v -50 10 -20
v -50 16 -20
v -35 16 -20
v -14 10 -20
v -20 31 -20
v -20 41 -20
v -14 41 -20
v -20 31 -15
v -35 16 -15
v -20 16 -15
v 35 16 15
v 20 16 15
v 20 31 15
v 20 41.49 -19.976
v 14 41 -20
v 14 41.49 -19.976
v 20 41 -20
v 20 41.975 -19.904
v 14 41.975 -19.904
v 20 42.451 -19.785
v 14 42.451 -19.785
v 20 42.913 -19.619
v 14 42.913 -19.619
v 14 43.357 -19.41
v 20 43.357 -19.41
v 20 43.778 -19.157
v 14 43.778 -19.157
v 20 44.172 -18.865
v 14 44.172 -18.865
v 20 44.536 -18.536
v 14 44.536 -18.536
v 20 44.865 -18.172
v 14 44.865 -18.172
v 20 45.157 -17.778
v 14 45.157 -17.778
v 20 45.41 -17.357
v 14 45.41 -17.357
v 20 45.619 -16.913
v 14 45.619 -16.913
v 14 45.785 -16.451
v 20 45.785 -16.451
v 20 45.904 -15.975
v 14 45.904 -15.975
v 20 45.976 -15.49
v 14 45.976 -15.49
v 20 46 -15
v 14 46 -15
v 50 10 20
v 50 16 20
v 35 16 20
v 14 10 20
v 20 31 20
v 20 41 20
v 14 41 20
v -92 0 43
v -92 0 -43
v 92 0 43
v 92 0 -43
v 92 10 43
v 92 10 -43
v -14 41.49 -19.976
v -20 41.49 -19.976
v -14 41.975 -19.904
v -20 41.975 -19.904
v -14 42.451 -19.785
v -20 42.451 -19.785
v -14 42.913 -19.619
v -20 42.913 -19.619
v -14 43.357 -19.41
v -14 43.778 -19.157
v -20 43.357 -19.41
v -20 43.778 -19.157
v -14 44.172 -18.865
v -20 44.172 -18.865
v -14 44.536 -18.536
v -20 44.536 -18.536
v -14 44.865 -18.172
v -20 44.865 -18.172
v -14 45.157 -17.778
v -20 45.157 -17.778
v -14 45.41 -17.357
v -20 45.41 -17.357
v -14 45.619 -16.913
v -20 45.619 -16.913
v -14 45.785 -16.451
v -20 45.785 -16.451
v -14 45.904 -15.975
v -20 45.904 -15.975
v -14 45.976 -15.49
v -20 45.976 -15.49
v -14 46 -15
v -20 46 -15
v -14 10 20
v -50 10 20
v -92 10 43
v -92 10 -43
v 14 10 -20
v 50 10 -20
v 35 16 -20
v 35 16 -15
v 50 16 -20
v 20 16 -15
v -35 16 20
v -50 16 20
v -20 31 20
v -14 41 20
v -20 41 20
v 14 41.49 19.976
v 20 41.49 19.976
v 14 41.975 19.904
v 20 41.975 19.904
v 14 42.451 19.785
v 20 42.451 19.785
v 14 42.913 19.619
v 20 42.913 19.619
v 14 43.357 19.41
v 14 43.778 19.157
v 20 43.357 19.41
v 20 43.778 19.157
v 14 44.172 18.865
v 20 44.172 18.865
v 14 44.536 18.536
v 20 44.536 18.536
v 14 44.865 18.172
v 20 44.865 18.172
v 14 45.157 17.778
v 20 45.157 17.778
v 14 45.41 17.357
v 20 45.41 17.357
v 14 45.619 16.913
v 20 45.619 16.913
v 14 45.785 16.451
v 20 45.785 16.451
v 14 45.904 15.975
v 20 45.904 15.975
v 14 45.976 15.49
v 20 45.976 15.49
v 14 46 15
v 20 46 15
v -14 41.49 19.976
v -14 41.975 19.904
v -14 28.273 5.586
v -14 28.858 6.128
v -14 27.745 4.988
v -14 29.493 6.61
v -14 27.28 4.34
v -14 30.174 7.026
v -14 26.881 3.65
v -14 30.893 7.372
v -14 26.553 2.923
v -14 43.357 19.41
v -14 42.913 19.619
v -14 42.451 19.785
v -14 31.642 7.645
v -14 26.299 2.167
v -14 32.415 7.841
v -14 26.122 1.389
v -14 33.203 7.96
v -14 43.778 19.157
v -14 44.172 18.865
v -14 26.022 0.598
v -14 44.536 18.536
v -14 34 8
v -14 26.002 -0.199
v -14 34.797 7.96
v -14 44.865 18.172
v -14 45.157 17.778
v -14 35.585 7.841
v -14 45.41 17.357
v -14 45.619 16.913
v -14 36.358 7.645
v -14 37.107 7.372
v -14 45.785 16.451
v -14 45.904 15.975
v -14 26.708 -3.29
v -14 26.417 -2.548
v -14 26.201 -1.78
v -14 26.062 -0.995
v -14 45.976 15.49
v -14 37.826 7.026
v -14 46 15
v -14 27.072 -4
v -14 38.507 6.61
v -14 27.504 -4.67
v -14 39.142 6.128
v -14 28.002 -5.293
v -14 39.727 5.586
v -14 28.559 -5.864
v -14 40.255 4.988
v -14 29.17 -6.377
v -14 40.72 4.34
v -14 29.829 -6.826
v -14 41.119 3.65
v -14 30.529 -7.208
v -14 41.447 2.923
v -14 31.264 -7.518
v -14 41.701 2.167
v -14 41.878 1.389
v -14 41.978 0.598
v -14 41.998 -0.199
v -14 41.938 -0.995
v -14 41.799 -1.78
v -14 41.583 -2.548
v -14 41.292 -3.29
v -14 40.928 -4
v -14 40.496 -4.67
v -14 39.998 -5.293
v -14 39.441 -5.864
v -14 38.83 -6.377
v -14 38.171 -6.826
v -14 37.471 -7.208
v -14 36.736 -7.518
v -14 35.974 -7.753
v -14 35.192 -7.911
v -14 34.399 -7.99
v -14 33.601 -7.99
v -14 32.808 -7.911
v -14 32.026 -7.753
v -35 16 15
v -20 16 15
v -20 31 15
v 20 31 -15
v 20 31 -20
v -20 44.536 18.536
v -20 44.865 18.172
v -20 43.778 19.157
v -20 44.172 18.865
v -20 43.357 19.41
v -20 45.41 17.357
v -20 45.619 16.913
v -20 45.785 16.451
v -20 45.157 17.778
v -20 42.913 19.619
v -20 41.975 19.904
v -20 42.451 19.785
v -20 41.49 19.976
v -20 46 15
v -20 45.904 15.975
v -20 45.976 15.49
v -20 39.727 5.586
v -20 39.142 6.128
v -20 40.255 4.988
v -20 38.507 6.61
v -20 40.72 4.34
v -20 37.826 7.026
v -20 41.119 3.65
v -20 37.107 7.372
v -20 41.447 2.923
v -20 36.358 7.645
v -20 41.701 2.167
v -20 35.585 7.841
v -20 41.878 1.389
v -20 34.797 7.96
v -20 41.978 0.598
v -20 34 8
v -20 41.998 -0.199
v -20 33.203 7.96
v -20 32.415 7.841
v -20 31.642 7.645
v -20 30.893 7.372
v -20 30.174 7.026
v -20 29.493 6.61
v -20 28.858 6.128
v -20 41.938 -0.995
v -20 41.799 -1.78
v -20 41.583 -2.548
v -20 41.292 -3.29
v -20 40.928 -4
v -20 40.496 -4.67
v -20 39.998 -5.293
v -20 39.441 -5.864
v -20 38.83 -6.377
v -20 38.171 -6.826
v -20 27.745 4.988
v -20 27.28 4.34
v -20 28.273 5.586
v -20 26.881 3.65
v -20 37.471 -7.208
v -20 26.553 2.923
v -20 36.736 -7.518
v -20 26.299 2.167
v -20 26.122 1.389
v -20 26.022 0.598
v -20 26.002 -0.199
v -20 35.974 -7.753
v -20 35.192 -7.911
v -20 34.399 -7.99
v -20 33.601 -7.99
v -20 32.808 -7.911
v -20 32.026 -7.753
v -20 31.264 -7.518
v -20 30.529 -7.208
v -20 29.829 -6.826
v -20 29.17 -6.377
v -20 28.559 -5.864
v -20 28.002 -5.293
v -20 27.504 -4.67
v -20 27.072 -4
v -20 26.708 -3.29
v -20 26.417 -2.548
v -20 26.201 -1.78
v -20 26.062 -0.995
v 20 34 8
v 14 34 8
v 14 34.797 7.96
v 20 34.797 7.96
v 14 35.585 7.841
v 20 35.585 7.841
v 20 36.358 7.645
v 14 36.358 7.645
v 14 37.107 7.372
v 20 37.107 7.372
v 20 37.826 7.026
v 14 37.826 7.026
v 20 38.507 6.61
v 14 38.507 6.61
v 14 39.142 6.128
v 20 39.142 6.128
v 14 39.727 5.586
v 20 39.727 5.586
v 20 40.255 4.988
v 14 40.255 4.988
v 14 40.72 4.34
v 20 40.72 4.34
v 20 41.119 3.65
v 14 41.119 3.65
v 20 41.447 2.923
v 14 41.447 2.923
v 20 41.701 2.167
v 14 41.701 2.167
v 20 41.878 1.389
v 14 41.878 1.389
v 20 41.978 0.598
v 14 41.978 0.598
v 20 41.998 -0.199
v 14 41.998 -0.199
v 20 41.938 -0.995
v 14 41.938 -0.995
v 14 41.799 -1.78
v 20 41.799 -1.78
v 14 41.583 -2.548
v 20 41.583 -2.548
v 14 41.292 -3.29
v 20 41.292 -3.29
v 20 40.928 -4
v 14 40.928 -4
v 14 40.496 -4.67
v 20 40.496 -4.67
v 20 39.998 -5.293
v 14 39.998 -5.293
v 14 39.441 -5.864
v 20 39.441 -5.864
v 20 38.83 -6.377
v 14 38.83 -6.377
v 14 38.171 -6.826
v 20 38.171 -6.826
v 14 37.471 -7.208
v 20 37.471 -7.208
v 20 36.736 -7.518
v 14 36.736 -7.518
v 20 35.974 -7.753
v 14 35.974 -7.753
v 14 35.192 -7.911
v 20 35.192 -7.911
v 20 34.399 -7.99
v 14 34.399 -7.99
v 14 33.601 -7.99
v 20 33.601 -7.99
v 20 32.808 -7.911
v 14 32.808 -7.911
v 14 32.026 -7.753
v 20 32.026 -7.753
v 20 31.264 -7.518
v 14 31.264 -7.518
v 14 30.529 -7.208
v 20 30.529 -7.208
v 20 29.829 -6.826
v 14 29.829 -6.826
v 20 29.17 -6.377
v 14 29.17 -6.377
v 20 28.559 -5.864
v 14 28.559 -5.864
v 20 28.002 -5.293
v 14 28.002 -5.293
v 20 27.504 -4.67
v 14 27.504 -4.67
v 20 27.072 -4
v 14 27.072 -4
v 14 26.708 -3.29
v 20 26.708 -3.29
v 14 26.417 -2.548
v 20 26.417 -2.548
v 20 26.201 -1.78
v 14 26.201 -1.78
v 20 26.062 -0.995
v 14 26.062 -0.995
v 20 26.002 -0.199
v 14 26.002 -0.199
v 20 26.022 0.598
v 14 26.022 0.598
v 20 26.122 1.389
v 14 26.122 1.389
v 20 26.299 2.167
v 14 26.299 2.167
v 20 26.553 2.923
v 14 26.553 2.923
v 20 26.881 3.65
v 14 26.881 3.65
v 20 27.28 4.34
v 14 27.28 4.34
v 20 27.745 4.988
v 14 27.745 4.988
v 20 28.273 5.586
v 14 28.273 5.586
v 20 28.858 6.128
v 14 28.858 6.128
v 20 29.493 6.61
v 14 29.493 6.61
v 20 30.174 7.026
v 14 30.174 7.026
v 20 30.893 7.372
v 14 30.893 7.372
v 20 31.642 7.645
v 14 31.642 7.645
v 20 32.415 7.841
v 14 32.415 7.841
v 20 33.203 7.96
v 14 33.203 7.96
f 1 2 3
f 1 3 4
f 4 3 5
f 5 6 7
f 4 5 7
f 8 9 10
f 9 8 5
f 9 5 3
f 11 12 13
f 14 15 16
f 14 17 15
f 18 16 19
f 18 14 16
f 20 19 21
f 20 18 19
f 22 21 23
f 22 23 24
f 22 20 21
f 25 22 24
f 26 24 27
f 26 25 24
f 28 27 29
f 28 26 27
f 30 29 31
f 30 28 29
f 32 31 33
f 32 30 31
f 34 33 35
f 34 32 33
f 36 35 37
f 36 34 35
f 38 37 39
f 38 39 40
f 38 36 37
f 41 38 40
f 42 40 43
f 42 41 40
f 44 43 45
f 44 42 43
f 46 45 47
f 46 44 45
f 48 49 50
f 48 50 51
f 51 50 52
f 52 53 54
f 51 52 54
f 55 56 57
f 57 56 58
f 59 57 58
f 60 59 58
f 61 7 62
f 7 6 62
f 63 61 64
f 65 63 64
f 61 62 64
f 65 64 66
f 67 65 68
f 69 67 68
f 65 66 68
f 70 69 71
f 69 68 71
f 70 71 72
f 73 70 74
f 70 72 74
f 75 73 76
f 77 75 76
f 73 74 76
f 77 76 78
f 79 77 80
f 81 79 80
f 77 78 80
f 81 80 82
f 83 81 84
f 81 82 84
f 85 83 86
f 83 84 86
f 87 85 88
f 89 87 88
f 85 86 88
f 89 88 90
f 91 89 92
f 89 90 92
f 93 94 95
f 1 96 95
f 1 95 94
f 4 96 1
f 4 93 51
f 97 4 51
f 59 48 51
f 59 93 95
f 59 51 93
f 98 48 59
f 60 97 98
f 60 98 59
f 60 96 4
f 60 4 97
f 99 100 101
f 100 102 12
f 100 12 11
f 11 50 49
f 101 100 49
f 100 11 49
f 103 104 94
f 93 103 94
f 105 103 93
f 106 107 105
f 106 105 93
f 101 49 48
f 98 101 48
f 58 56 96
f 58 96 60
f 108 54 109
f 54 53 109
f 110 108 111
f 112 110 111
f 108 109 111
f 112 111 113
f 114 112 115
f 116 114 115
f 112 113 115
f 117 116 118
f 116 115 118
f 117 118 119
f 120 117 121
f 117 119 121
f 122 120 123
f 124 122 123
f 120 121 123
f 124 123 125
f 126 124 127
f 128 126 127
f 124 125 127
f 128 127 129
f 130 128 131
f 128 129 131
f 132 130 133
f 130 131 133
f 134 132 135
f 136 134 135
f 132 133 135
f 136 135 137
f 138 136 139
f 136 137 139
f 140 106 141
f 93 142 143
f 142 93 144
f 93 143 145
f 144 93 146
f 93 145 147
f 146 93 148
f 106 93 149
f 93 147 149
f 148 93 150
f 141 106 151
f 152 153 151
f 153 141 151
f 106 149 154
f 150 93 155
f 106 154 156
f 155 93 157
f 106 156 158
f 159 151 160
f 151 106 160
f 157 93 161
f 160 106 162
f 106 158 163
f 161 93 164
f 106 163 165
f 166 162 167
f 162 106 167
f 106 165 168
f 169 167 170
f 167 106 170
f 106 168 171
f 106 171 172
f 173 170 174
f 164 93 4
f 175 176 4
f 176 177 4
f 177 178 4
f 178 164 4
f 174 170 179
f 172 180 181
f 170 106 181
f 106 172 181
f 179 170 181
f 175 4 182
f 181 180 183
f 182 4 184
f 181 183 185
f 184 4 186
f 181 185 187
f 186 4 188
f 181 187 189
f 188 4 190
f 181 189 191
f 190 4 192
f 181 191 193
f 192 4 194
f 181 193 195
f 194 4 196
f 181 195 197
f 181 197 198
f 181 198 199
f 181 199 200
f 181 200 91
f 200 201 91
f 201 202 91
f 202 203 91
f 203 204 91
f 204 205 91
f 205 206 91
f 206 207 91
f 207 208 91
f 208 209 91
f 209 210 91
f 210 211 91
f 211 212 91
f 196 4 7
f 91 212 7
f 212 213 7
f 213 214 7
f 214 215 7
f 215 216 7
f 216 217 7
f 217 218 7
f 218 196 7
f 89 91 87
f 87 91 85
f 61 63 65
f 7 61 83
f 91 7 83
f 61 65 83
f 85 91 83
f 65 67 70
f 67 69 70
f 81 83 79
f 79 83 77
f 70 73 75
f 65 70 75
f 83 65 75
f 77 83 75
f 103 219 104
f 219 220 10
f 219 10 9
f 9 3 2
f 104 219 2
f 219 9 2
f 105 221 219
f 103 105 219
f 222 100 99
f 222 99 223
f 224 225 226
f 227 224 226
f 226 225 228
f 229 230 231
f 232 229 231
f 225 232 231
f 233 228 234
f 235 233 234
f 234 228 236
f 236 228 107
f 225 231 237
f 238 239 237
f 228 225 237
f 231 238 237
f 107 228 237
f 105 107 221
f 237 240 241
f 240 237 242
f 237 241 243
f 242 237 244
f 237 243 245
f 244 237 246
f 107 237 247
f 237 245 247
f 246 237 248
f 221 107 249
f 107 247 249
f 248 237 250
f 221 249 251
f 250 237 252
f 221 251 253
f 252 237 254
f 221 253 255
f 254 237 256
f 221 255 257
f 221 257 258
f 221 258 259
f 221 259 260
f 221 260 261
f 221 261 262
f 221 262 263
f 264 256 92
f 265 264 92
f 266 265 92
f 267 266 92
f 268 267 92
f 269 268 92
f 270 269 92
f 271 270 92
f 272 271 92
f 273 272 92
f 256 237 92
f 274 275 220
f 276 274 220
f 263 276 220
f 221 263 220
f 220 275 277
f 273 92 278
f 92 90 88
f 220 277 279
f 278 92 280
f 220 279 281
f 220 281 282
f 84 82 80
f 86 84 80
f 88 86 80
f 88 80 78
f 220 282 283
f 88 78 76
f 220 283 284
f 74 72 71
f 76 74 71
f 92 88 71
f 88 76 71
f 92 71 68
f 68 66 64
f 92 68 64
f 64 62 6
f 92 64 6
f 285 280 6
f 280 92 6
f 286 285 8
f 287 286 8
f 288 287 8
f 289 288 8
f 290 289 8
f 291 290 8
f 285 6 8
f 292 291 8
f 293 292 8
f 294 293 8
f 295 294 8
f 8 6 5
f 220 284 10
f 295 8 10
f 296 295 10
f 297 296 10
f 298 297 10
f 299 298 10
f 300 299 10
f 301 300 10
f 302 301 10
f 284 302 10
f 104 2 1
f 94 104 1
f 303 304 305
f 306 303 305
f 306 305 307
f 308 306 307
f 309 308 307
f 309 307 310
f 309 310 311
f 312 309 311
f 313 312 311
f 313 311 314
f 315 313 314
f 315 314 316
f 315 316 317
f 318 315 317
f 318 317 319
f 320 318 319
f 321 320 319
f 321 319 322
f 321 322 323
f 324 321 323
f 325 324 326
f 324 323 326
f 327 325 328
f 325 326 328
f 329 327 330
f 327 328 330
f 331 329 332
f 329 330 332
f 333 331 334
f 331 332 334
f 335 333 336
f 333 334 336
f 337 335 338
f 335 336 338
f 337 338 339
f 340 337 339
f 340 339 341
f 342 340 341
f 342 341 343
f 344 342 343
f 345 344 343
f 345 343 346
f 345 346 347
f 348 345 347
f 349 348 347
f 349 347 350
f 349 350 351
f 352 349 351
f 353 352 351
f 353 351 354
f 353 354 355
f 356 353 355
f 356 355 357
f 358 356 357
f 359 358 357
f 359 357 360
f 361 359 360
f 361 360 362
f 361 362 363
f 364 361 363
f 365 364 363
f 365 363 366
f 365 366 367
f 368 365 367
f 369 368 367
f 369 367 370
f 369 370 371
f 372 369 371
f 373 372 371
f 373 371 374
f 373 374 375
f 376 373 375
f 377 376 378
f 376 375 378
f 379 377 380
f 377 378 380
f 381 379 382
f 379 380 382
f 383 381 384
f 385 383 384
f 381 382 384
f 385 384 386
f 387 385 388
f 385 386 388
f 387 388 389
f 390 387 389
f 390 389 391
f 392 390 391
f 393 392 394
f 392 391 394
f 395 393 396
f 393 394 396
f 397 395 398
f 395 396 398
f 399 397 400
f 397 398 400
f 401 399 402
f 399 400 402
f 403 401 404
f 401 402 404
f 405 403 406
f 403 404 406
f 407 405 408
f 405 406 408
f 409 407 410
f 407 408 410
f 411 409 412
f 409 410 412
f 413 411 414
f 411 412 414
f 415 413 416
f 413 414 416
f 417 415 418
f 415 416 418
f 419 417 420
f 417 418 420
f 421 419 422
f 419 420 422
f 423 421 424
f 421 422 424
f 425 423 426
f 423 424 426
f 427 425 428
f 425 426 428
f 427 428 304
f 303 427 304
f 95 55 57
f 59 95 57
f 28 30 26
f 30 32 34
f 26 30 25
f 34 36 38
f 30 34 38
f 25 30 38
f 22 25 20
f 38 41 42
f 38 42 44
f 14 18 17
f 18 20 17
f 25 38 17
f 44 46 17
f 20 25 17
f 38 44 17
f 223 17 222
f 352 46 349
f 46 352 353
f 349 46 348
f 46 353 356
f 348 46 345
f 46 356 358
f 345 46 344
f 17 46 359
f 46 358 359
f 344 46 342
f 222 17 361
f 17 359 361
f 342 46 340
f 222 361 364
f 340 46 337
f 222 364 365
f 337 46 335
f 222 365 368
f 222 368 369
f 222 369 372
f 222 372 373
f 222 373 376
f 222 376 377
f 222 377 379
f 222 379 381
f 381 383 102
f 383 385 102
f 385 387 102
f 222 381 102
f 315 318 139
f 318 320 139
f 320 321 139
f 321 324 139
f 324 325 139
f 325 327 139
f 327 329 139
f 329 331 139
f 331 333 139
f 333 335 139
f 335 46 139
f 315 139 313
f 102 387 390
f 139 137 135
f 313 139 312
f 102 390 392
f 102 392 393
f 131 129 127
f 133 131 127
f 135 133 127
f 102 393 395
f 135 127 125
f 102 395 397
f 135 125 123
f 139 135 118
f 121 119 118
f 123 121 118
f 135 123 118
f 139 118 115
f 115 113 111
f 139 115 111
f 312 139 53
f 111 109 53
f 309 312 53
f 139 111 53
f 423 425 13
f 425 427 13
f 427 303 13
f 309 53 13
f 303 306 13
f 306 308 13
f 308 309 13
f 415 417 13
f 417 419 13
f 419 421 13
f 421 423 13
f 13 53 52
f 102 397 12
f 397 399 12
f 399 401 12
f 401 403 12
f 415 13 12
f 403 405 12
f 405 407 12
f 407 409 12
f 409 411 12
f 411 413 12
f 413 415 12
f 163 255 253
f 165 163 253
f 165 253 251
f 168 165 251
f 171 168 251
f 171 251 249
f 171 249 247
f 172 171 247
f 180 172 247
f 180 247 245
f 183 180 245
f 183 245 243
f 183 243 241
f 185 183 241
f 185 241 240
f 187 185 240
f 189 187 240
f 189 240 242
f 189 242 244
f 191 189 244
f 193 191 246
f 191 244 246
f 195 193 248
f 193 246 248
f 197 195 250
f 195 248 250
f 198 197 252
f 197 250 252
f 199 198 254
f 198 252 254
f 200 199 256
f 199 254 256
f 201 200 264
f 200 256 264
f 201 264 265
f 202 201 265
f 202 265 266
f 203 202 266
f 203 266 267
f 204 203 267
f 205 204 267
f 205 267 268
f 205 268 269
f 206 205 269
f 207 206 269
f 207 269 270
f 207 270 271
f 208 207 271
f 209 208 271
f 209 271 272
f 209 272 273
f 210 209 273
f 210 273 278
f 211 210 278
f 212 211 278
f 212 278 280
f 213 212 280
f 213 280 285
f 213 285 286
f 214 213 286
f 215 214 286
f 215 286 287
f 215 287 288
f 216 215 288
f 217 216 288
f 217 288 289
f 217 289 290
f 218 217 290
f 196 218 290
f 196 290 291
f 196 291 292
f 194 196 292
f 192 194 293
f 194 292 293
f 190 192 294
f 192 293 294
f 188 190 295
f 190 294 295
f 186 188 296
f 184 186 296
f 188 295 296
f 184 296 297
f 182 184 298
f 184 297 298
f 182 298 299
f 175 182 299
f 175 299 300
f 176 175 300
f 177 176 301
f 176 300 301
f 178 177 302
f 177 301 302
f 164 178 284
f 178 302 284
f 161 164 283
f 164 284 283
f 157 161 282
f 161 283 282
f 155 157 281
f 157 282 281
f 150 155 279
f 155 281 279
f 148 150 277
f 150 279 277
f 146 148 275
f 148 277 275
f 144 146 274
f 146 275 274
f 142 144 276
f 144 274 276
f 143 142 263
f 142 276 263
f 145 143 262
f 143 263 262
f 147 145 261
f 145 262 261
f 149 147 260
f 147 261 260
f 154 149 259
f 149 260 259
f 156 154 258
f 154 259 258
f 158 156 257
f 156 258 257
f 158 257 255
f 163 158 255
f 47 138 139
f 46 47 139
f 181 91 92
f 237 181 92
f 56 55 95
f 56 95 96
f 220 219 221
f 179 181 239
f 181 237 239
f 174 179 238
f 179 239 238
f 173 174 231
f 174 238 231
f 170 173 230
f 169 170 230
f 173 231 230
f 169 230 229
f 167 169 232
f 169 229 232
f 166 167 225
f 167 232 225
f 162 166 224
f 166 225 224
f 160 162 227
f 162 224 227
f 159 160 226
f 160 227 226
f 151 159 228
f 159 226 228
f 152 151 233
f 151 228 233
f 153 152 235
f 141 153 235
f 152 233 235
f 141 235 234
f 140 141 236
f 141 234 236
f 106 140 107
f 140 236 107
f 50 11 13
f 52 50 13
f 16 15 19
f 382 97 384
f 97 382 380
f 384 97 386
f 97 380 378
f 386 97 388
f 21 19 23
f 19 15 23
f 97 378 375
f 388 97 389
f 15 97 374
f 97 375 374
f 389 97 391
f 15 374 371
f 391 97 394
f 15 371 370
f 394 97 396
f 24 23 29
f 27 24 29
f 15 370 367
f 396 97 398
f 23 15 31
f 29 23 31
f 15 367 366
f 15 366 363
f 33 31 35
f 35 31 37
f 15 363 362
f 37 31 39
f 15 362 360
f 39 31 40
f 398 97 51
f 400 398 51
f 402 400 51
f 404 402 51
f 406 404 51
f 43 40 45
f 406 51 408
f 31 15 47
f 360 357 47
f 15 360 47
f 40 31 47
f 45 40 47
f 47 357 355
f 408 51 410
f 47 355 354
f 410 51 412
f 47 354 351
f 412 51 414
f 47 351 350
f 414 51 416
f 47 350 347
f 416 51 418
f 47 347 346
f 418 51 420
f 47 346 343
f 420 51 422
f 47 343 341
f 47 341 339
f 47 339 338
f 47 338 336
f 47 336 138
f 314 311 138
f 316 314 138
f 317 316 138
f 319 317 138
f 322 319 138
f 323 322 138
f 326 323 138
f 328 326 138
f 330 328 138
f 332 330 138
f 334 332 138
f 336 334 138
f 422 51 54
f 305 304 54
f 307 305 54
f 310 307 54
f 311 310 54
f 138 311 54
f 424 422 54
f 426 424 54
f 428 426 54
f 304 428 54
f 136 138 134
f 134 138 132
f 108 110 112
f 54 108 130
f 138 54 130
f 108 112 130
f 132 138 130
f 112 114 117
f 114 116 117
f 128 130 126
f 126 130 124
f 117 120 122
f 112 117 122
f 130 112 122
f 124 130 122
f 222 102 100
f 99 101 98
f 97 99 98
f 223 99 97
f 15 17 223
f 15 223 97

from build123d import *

# Parameters (mm, degrees)
SKETCH1_W           = 184
SKETCH1_H           = 86
PLATE_DEPTH         = 10
BOSS_EXTRUDE1_DEPTH = 20
BOSS_EXTRUDE2_START = 15
BOSS_EXTRUDE2_DEPTH = 5
BOSS_EXTRUDE3_START = -15
BOSS_EXTRUDE3_DEPTH = 5
SKETCH3_R           = 8
CUT_EXTRUDE1_DEPTH  = 40
FILLET1_R           = 5


with BuildPart() as part:
    # Sketch1 → plate (new body)
    with BuildSketch(Plane(origin=(0, 0, 0), x_dir=(1, 0, 0), z_dir=(0, 1, 0))):
        Rectangle(SKETCH1_W, SKETCH1_H)
    extrude(amount=PLATE_DEPTH)

    # Sketch2 → Boss-Extrude1 (add, symmetric)
    with BuildSketch(Plane.XY):
        Polygon((-14, 10), (-14, 46), (-20, 46), (-20, 16), (-50, 16), (-50, 10), align=None)
        Polygon((50, 16), (50, 10), (14, 10), (14, 46), (20, 46), (20, 16), align=None)
    extrude(amount=BOSS_EXTRUDE1_DEPTH, both=True)

    # Sketch2<3> → Boss-Extrude2 (add)
    with BuildSketch(Plane.XY.offset(BOSS_EXTRUDE2_START)):
        Polygon((-20, 16), (-20, 31), (-35, 16), align=None)
        Polygon((35, 16), (20, 31), (20, 16), align=None)
    extrude(amount=BOSS_EXTRUDE2_DEPTH)

    # Sketch2<4> → Boss-Extrude3 (add)
    with BuildSketch(Plane.XY.offset(BOSS_EXTRUDE3_START)):
        Polygon((-20, 16), (-20, 31), (-35, 16), align=None)
        Polygon((35, 16), (20, 31), (20, 16), align=None)
    extrude(amount=-BOSS_EXTRUDE3_DEPTH)

    # Sketch3 → Cut-Extrude1 (cut)
    with BuildSketch(Plane.ZY.offset(20)):
        with Locations((0, 34)):
            Circle(SKETCH3_R)
    extrude(amount=-CUT_EXTRUDE1_DEPTH, mode=Mode.SUBTRACT)

    # Fillet1
    fillet1_edges = [part.edges().sort_by_distance(p)[0] for p in [
        (-17, 46, -20),
        (-17, 46, 20),
        (17, 46, 20),
        (17, 46, -20),
    ]]
    fillet(fillet1_edges, radius=FILLET1_R)


solid = part.part
